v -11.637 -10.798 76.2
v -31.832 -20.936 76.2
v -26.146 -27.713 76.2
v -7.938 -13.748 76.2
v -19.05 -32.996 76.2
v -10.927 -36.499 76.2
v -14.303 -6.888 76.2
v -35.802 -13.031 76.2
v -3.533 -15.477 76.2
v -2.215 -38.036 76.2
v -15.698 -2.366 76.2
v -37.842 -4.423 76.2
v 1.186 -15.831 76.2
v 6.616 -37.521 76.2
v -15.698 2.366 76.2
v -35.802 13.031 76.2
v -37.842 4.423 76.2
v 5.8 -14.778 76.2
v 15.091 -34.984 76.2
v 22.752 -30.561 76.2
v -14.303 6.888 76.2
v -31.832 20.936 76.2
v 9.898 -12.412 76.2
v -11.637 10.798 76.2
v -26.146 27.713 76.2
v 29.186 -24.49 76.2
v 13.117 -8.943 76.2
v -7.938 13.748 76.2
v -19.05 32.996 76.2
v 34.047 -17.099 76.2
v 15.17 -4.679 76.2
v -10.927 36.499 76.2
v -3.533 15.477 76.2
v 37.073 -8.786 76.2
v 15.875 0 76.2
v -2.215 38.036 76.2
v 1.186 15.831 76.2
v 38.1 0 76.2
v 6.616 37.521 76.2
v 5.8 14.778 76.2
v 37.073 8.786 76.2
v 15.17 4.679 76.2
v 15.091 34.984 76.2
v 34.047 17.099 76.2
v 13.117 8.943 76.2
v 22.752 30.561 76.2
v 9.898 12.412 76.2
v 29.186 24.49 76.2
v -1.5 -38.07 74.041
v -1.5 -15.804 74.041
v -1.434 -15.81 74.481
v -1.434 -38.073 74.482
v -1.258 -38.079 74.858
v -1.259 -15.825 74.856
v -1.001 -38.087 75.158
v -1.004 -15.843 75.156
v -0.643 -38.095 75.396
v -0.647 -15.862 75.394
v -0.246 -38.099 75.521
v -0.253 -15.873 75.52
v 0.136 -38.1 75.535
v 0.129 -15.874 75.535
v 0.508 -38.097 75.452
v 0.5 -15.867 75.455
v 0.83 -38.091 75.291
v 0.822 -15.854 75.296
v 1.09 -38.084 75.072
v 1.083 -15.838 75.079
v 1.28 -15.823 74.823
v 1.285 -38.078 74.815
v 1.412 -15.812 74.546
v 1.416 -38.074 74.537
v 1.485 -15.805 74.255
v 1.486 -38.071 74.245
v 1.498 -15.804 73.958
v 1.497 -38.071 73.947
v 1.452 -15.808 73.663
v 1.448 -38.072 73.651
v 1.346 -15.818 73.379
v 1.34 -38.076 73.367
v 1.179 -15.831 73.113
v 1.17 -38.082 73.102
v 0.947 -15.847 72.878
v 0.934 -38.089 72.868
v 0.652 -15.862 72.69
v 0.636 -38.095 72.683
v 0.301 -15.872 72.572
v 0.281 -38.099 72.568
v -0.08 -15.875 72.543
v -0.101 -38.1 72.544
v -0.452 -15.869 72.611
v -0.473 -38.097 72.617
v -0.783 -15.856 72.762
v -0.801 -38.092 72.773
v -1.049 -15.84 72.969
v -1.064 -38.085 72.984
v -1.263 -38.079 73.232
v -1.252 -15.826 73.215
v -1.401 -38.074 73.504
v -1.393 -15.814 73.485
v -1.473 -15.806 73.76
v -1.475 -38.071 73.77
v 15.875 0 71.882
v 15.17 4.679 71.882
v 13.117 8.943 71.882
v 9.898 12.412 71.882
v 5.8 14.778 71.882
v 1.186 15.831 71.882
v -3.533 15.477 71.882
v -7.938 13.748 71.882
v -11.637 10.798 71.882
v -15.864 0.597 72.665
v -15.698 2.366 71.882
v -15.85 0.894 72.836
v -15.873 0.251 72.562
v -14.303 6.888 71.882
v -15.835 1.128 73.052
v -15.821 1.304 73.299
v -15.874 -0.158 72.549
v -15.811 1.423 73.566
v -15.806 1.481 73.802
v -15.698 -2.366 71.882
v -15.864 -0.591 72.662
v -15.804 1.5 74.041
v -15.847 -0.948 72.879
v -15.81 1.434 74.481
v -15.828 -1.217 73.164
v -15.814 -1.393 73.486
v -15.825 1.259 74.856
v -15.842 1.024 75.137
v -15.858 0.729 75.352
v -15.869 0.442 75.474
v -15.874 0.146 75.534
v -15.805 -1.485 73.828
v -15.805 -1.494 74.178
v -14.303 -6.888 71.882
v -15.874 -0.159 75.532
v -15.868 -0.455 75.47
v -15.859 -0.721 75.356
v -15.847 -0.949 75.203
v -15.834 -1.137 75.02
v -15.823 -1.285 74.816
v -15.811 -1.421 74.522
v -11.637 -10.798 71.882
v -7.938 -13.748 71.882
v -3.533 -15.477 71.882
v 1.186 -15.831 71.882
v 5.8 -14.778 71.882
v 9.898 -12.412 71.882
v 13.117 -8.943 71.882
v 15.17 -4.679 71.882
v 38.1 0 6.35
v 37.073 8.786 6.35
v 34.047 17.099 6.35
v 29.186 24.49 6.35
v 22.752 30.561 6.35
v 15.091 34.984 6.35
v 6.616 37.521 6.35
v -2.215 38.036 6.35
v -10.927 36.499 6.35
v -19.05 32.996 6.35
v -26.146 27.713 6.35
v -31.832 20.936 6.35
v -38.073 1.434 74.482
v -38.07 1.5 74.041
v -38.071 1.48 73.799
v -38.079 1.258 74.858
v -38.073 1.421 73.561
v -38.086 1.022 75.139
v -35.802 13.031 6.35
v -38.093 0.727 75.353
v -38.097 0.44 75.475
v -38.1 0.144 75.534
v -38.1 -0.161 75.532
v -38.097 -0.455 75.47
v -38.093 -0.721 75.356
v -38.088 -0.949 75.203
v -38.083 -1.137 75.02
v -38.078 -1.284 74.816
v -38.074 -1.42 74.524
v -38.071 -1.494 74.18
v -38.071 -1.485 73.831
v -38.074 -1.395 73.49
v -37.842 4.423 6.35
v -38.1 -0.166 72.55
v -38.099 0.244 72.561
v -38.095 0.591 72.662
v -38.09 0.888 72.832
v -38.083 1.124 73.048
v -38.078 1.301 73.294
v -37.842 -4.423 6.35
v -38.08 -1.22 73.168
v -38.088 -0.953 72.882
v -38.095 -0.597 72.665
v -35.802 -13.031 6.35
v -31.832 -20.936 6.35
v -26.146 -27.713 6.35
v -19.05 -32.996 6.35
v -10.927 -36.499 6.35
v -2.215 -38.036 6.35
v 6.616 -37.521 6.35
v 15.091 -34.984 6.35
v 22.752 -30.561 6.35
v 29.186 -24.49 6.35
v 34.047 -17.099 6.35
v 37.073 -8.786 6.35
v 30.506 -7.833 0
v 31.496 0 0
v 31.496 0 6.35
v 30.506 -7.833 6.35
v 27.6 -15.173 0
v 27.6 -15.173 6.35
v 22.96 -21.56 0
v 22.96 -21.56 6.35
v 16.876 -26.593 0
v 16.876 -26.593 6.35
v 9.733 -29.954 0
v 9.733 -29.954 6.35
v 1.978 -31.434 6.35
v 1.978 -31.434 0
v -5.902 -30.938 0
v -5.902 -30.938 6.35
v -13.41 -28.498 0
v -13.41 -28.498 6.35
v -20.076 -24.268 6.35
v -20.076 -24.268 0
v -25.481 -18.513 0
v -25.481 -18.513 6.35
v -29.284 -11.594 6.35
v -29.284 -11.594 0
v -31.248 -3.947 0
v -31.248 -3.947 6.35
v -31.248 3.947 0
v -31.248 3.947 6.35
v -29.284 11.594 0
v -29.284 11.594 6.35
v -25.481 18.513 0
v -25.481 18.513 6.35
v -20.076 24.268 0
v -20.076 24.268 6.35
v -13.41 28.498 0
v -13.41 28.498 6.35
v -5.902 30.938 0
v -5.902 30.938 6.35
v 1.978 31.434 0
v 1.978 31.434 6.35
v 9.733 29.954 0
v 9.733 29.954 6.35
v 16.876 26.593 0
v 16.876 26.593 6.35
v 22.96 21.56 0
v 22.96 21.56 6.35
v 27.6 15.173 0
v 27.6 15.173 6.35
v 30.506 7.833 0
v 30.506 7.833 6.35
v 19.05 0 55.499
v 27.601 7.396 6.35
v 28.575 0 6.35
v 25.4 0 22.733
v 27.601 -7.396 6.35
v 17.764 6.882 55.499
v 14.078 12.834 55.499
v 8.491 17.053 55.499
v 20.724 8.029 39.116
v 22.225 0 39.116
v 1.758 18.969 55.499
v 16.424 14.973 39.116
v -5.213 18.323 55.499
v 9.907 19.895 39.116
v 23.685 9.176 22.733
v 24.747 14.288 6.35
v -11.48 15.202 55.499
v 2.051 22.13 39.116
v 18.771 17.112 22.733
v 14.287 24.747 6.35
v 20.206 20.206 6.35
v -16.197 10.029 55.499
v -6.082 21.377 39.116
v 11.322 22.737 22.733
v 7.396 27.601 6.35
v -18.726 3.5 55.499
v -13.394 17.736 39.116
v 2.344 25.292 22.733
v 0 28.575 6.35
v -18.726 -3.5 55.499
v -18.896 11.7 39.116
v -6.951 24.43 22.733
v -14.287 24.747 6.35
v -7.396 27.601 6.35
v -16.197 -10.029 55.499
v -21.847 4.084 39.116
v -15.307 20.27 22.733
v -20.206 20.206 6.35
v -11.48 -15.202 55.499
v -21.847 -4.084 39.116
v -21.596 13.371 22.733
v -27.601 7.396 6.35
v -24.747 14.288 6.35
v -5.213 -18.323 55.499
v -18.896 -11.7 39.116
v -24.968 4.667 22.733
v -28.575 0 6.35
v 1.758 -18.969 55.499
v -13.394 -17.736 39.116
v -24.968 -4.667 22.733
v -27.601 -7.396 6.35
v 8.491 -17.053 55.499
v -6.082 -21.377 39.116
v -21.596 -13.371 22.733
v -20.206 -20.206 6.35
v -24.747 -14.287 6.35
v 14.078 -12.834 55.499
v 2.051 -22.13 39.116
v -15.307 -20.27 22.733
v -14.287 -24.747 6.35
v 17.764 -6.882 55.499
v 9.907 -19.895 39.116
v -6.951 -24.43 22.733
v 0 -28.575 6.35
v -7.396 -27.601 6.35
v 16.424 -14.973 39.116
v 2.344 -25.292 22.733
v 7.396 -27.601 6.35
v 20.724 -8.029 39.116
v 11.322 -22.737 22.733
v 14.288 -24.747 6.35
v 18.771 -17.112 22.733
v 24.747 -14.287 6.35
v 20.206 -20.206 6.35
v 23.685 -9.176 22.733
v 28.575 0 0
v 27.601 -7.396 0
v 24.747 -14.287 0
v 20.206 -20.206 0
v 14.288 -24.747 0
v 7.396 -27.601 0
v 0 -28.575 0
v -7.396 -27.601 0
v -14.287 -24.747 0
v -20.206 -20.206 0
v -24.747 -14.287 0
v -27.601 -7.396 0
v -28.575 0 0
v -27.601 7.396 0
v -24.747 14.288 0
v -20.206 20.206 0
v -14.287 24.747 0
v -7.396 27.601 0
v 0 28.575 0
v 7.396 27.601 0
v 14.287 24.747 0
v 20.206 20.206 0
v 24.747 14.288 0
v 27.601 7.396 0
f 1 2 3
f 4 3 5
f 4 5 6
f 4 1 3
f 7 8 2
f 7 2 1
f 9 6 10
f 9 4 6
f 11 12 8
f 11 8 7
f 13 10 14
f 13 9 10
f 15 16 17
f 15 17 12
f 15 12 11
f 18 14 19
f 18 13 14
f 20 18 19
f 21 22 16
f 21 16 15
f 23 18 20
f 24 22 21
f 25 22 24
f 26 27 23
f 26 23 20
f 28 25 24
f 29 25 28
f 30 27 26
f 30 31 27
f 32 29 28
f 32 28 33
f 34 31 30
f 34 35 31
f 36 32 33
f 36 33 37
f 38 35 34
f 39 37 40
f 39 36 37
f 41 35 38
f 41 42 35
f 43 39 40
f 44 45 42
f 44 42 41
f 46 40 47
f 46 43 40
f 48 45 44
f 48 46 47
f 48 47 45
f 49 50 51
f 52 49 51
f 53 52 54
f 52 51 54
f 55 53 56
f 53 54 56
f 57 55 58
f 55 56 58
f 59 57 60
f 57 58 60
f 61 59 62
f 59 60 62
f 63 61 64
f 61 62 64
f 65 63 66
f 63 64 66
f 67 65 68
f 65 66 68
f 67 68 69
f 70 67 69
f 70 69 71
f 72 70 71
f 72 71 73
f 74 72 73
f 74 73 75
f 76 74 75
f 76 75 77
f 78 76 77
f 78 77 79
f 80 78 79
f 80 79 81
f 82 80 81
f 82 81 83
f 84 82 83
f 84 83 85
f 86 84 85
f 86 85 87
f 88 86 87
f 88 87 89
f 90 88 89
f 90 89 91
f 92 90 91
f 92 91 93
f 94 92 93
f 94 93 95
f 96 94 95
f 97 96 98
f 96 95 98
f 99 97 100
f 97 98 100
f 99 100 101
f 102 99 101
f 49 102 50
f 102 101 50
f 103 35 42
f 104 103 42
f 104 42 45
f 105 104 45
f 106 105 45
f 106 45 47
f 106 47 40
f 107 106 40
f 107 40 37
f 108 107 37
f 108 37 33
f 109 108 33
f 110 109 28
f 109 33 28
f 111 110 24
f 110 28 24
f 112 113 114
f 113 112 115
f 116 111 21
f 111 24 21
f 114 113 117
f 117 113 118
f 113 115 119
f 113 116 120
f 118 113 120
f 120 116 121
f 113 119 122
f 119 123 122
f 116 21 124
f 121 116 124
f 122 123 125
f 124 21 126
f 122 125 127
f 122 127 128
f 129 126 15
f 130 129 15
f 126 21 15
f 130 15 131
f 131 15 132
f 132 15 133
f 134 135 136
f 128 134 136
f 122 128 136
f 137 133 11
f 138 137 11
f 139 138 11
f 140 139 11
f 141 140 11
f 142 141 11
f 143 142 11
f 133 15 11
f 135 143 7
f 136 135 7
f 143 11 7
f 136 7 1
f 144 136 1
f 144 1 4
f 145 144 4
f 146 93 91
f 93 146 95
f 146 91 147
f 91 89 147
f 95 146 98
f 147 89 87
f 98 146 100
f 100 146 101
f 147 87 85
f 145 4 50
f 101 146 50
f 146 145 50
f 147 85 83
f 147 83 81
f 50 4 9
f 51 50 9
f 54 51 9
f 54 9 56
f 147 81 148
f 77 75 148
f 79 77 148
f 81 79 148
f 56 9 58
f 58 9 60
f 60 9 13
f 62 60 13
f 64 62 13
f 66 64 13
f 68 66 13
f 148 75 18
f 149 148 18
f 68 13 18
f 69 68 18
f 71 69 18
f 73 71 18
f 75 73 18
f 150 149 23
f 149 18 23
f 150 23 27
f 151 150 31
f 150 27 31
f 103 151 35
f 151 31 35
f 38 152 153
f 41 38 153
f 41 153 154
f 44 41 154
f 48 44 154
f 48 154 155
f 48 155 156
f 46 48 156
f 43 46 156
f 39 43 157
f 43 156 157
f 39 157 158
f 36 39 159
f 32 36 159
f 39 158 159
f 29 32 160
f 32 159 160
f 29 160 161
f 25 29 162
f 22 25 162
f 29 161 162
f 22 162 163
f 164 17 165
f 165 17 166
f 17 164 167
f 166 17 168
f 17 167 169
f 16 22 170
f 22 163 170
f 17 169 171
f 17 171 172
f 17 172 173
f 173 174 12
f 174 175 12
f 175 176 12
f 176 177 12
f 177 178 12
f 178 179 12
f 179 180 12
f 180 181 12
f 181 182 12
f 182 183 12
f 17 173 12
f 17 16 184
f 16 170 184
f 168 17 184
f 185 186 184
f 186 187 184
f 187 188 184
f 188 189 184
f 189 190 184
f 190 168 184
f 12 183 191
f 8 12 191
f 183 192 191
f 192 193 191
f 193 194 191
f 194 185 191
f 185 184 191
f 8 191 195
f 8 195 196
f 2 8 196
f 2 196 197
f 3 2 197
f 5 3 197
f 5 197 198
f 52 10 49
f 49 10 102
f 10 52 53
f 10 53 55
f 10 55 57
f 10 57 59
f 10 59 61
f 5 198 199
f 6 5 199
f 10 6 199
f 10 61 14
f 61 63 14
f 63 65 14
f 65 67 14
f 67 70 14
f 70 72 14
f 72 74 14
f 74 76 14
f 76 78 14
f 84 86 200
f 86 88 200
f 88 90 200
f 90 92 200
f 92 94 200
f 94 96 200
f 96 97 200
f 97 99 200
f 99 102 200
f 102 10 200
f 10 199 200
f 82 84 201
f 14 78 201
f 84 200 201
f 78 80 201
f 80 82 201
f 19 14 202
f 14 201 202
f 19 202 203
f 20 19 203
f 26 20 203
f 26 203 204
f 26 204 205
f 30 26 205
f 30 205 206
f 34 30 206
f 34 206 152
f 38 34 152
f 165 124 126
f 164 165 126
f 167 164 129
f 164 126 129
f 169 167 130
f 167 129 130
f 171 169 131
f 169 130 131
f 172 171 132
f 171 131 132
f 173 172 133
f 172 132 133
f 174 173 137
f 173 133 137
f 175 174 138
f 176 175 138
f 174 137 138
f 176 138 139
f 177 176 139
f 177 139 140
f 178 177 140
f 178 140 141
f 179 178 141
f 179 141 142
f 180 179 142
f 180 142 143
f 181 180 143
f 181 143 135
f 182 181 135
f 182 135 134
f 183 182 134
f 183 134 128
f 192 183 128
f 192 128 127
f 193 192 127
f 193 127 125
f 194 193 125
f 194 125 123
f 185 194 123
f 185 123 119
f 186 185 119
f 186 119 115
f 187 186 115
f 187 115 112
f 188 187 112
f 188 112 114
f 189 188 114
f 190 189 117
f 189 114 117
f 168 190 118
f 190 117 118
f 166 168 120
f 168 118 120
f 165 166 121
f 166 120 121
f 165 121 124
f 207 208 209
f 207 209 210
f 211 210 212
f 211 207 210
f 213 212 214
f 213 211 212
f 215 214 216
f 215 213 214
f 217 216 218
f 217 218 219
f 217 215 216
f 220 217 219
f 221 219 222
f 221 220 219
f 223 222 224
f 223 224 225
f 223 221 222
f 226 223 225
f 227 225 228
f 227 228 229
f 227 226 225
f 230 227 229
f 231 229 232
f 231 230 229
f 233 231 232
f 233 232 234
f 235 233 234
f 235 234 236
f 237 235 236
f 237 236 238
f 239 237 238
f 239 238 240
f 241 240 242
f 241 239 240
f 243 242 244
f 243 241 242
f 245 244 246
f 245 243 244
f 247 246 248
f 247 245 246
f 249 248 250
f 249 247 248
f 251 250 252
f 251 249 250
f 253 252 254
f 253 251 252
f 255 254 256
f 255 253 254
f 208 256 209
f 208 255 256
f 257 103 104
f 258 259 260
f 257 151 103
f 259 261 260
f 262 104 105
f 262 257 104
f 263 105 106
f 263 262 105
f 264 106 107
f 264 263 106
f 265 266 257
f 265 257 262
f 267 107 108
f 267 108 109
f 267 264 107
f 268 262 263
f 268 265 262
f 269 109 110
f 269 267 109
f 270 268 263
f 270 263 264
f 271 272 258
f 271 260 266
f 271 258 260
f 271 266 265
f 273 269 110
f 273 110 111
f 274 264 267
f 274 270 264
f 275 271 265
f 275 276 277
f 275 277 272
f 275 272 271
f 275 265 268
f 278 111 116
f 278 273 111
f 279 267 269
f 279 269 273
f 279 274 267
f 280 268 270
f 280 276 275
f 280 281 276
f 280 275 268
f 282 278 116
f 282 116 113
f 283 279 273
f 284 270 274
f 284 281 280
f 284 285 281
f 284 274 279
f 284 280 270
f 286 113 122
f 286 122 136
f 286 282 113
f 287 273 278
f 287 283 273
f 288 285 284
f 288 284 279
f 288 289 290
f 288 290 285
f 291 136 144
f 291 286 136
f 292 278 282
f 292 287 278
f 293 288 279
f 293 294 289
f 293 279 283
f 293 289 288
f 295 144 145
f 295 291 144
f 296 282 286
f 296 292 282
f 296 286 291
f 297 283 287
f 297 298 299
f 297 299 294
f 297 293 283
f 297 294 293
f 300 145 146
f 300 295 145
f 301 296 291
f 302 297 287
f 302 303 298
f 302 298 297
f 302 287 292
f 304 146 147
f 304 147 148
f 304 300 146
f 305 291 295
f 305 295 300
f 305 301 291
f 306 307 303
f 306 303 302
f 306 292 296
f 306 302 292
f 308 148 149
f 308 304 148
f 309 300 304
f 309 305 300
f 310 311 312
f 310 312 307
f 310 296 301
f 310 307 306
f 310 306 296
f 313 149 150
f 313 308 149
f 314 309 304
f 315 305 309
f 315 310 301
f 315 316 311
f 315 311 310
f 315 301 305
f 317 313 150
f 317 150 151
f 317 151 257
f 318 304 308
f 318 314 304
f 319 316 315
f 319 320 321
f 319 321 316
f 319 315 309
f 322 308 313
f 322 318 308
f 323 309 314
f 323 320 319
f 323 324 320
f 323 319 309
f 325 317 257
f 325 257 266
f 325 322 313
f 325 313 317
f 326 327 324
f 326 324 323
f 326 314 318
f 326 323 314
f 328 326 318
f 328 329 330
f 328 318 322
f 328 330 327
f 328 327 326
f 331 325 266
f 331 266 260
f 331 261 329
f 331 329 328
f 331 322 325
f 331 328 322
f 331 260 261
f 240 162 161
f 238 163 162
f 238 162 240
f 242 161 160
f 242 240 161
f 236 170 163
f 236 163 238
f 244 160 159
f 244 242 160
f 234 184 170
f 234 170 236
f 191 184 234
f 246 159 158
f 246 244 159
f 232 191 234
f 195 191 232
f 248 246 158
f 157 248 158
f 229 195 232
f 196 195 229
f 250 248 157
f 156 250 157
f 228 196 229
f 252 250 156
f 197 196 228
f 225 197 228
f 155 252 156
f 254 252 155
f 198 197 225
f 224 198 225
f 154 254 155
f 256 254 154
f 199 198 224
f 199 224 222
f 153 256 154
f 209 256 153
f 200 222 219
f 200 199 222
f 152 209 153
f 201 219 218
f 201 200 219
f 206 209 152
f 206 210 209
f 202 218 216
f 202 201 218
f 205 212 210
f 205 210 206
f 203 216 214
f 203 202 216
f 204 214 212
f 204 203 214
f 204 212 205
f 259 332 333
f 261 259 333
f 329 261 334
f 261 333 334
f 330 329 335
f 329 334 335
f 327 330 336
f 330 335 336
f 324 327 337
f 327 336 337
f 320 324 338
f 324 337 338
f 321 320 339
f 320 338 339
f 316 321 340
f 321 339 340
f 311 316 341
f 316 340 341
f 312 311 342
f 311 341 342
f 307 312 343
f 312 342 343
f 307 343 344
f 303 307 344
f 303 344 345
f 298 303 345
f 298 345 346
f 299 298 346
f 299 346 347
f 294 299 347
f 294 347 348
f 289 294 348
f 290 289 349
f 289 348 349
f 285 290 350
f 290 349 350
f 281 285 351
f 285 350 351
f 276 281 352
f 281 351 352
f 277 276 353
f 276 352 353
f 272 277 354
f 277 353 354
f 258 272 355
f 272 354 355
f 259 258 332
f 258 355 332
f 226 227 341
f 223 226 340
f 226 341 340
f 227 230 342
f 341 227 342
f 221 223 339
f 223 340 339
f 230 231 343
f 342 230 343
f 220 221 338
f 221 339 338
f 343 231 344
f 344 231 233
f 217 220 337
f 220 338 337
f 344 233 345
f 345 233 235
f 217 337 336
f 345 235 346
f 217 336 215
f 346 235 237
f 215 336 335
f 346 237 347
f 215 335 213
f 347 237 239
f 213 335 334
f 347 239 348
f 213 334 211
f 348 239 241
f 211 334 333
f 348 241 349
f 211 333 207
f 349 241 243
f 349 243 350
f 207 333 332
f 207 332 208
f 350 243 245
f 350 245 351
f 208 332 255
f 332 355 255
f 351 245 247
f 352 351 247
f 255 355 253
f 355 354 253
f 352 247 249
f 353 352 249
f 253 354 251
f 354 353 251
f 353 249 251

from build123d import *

# Parameters (mm, degrees)
F0_R            = 38.1
F1_DEPTH        = 76.2
F3_R            = 28.575
F4_DEPTH        = 6.35
F5_R            = 1.5
F6_DEPTH        = 50.8
F6_COPIES_COUNT = 2
F6_COPIES_ANGLE = 90
F2_R            = 15.875
F7_DEPTH        = 4.318
F7_FACE_R       = 15.875
F4_FACE_R       = 28.575
F9_R            = 38.1
F9_R_2          = 31.496
F10_DEPTH       = 6.35


# Not quite as in the source:
# - a pattern or mirror of a feature is missing from the dataset's text; its kind, count and spacing are read off the source's solid


with BuildPart() as f1:
    # F0 (on Top) → F1 (new body)
    with BuildSketch(Plane.XY):
        Circle(F0_R)
    extrude(amount=F1_DEPTH)

    # F3 (on face) → F4 (cut)
    with BuildSketch(Plane(origin=(0, 0, 0), x_dir=(1, 0, 0), z_dir=(0, 0, -1))):
        Circle(F3_R)
    extrude(amount=-F4_DEPTH, mode=Mode.SUBTRACT)

    # F5 (on Right) → F6 (cut)
    with BuildSketch(Plane.YZ):
        with Locations((0, 74.041)):
            Circle(F5_R)
    f6 = extrude(amount=-F6_DEPTH, mode=Mode.SUBTRACT)

    # F6_copies: F6 ×2 about axis
    f6_copies_axis = Axis((0, 0, 0), (0, 0, 1))
    for i in range(1, F6_COPIES_COUNT):
        add(f6.rotate(f6_copies_axis, i * F6_COPIES_ANGLE / (F6_COPIES_COUNT - 1)), mode=Mode.SUBTRACT)

    # F2 (on face) → F7 (cut)
    with BuildSketch(Plane.XY.offset(76.2)):
        Circle(F2_R)
    extrude(amount=-F7_DEPTH, mode=Mode.SUBTRACT)

    # F7_face (on face) → F8 section 0
    with BuildSketch(Plane.XY.offset(71.882)):
        Circle(F7_FACE_R)
    # F4_face (on face) → F8 section 1
    with BuildSketch(Plane(origin=(0, 0, 6.35), x_dir=(1, 0, 0), z_dir=(0, 0, -1))):
        Circle(F4_FACE_R)
    loft(mode=Mode.SUBTRACT)

    # F9 (on face) → F10 (cut)
    with BuildSketch(Plane(origin=(0, 0, 0), x_dir=(1, 0, 0), z_dir=(0, 0, -1))):
        Circle(F9_R)
        Circle(F9_R_2, mode=Mode.SUBTRACT)
    extrude(amount=-F10_DEPTH, mode=Mode.SUBTRACT)


solid = f1.part
